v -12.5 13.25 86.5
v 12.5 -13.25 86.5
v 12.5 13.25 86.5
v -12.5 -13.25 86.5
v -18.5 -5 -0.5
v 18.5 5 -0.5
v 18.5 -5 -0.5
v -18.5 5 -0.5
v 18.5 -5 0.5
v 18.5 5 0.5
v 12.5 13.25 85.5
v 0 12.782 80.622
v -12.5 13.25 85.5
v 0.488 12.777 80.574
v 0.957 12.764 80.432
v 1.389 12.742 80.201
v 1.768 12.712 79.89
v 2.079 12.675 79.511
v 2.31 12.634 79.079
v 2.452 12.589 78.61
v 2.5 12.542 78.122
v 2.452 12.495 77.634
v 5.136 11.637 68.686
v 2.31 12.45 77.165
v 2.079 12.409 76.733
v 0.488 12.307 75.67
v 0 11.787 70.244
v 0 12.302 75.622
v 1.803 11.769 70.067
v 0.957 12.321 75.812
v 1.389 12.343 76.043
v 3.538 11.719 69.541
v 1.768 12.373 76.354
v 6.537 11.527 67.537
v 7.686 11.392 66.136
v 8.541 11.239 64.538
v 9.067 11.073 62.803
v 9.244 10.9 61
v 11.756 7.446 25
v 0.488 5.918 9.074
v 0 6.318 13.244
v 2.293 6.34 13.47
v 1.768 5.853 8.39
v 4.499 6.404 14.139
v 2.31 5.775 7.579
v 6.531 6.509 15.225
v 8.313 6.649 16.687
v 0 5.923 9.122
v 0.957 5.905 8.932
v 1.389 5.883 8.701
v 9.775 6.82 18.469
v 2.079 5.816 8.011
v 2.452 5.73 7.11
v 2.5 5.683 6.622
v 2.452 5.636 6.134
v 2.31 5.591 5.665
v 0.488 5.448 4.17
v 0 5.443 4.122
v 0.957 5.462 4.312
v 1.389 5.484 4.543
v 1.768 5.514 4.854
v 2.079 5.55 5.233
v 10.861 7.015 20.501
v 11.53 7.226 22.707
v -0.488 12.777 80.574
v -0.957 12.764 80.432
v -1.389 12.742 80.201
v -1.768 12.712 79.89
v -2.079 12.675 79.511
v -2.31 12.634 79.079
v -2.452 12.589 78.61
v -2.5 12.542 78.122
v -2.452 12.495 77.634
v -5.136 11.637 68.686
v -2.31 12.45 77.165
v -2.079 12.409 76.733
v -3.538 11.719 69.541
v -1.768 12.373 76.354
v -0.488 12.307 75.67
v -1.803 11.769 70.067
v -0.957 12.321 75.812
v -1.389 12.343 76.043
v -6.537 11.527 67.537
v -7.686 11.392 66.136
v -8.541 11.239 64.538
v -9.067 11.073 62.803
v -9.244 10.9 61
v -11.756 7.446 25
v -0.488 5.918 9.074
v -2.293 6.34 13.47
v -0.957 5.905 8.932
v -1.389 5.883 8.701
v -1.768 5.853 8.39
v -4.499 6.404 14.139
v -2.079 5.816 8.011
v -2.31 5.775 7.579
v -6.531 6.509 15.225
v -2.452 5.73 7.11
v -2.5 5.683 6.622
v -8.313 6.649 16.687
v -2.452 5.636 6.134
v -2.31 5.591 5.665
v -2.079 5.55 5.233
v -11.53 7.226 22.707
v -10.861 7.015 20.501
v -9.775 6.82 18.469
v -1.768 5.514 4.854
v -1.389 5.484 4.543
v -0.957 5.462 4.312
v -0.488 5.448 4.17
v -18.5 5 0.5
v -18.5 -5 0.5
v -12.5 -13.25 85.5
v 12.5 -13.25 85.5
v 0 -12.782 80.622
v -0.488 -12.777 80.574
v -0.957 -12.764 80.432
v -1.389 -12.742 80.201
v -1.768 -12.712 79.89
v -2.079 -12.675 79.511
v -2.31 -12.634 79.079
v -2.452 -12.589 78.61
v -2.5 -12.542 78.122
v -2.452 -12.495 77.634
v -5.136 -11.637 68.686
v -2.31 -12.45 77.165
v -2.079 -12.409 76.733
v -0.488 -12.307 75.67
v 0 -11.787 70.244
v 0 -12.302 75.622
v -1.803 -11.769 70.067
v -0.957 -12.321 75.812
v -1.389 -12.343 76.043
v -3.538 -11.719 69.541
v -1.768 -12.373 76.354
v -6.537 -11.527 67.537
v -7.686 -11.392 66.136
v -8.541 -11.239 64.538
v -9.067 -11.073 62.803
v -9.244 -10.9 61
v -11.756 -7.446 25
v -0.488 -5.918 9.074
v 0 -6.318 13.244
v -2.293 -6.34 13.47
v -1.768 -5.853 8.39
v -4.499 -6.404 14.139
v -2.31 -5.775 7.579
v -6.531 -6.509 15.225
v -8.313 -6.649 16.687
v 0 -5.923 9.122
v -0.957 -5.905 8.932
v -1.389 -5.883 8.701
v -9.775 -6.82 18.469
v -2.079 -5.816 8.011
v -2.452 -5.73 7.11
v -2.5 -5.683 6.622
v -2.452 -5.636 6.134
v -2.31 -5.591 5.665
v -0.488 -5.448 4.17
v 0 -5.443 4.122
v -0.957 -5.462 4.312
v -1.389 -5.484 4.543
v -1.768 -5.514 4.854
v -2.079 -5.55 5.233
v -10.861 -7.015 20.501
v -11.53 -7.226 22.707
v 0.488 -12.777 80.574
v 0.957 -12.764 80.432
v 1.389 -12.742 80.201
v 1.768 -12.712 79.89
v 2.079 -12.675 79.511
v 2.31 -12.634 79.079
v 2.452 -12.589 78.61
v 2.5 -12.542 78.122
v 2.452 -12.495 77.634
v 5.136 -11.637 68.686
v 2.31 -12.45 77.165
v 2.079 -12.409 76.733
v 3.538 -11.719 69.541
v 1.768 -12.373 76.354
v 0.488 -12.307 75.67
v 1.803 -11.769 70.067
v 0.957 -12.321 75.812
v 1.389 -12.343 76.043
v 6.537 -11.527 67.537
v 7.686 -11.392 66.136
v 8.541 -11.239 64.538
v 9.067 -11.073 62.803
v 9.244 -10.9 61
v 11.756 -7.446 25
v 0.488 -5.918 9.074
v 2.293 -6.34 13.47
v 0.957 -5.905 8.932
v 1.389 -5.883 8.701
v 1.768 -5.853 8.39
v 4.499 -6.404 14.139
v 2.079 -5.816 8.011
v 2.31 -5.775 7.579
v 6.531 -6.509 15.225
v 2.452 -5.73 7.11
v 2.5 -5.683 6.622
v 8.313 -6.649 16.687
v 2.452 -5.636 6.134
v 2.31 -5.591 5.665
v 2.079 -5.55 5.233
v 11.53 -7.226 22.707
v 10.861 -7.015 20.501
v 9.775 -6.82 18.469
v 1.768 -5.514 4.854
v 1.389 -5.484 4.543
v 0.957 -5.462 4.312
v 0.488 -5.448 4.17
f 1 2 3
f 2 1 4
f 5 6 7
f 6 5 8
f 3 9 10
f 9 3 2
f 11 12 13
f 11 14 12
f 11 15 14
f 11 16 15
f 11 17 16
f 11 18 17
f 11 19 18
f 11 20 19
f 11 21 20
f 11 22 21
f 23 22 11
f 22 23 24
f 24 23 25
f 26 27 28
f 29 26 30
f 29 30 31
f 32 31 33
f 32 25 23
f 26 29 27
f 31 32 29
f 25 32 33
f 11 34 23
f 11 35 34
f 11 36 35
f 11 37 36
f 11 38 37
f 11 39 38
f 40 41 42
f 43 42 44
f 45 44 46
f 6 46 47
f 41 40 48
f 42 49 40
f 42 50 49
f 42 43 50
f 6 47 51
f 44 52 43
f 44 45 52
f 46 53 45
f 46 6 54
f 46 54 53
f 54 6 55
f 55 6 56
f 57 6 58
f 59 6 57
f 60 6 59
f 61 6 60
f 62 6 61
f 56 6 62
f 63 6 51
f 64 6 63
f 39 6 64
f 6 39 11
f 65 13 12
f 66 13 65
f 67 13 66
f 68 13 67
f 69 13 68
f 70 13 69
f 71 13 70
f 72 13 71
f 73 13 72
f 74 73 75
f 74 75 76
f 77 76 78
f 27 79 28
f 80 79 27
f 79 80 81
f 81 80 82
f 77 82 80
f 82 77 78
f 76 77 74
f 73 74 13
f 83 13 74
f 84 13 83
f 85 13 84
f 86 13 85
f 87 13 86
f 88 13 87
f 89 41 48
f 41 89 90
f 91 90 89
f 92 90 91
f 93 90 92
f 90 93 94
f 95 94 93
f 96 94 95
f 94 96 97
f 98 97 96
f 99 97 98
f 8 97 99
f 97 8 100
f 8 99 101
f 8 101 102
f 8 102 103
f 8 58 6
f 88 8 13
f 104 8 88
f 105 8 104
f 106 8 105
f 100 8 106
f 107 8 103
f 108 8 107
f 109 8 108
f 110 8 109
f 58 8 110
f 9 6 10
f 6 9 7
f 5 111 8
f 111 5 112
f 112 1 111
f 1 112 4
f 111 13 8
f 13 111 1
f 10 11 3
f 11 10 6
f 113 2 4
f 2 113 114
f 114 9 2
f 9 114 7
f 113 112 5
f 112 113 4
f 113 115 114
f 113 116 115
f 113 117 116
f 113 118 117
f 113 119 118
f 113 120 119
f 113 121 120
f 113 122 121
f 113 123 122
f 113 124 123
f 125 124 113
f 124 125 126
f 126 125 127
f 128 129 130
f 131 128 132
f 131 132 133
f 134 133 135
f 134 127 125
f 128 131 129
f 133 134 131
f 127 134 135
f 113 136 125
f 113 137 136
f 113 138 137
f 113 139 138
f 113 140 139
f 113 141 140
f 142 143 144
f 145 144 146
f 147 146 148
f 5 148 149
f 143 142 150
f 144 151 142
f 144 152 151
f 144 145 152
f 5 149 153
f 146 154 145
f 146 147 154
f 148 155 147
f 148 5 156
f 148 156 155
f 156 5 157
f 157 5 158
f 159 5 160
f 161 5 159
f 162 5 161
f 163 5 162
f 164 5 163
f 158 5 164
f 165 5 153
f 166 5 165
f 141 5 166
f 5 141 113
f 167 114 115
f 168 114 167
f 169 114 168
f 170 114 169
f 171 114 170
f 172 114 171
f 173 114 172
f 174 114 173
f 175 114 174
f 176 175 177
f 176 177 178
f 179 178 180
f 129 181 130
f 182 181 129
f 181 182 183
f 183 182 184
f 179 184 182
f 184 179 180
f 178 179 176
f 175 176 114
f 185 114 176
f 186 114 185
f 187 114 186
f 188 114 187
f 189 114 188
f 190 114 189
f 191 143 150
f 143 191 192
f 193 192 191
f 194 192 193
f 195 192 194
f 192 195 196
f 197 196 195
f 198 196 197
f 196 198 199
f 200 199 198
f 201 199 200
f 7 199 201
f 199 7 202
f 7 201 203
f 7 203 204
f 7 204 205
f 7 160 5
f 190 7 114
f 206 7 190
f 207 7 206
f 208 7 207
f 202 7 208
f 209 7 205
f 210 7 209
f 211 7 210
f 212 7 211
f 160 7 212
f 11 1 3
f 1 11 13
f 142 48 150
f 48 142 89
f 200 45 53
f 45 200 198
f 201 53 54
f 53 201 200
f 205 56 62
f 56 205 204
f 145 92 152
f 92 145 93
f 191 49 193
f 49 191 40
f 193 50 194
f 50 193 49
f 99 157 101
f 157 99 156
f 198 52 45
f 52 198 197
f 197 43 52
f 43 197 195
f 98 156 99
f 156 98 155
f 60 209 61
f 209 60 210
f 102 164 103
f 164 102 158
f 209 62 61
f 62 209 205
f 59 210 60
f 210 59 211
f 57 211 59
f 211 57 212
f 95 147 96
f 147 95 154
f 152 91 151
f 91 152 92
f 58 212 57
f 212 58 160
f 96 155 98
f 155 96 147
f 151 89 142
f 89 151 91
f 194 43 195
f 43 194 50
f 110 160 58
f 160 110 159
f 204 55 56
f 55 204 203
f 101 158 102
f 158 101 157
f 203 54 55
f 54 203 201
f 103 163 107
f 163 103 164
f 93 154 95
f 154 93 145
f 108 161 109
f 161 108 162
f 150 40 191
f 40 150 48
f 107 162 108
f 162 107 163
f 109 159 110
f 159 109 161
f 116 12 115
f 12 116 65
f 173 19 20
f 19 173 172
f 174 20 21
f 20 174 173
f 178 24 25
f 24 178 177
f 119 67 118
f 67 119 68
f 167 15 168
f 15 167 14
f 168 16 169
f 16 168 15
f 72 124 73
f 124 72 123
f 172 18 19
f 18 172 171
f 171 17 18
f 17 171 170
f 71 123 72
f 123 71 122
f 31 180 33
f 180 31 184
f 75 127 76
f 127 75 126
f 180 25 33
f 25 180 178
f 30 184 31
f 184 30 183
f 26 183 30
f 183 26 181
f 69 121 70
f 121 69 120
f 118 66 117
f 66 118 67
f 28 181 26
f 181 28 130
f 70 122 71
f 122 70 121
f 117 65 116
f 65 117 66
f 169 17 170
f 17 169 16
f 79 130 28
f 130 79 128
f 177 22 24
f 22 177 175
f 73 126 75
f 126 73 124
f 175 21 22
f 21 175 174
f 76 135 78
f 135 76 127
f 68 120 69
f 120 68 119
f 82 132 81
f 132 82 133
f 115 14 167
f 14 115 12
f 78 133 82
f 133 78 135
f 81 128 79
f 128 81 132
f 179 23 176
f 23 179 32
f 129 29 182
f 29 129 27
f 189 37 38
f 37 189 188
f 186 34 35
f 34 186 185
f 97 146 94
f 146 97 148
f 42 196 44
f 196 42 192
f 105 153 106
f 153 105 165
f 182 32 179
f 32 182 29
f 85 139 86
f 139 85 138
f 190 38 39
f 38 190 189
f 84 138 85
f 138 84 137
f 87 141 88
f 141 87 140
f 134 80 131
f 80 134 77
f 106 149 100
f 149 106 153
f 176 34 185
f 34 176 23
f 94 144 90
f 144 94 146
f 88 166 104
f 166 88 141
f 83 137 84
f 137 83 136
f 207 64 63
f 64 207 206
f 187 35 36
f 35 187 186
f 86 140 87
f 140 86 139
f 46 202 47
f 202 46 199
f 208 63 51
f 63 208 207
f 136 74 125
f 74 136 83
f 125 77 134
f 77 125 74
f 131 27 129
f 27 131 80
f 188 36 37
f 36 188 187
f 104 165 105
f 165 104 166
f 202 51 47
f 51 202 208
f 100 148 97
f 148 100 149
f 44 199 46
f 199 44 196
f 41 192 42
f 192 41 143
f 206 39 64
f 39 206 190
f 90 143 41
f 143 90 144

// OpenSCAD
/*
Parameterized IKEA Samla Wedge NG
Copyright (C) 2024  nomike[AT]nomike[DOT]com

This program is free software: you can redistribute it and/or modify
it under the terms of the GNU General Public License as published by
the Free Software Foundation, either version 3 of the License, or
(at your option) any later version.

This program is distributed in the hope that it will be useful,
but WITHOUT ANY WARRANTY; without even the implied warranty of
MERCHANTABILITY or FITNESS FOR A PARTICULAR PURPOSE.  See the
GNU General Public License for more details.

You should have received a copy of the GNU General Public License
along with this program.  If not, see <http://www.gnu.org/licenses/>.
*/

// Parameterized IKEA Samla Wedge NG
// created by nomike
// licensed under GPLv3
// created by iggy 
// licensed under CC BY-SA (https://creativecommons.org/licenses/by-sa/4.0/)
// remixed from https://www.thingiverse.com/thing:479007 by Dvogonen


total_height = 87;
bottom_x = 37;
bottom_y = 10;
top_x = 25;
top_y = 26.5;
// Holes for putting zip-ties through
hole_diameter = 5;
// gap between the top/bottom surface and the rim of the oval cutout
oval_z_offset = 25;
// gap between the sides and the oval cutout; Set to something big to remove the cutout completely
oval_y_offset = 10;

/* [Hidden] */
x = 12;

_calculated_height = total_height - 1;
_bottom_oval_z_offset = oval_z_offset;
_top_oval_z_offset_from_top = _calculated_height - oval_z_offset;
_wide_z_offset = _calculated_height;
_oval_top_diameter = bottom_x - (((_wide_z_offset - oval_z_offset)/_calculated_height)*(bottom_x - top_x)) - oval_y_offset;
_oval_bottom_diameter = bottom_x - ((oval_z_offset/_calculated_height)*(bottom_x - top_x)) - oval_y_offset;

_bottom_hole_offset = (_bottom_oval_z_offset - (_oval_bottom_diameter / 2)) / 2;
_top_hole_offset = _top_oval_z_offset_from_top + ((_calculated_height  
- _top_oval_z_offset_from_top) / 2) + (_oval_top_diameter / 4);

difference (){
    color("green") hull(){
        cube([bottom_x,bottom_y,1],center=true);
        translate([0,0,_wide_z_offset]) cube([top_x,top_y,1],center=true);
    }

    color("red") translate([0,0,_bottom_hole_offset]) rotate([90,0,0]) cylinder(d=hole_diameter,h=top_y,center=true,$fn=32);
    color("blue") translate([0,0,_top_hole_offset]) rotate([90,0,0]) cylinder(d=hole_diameter,h=top_y+10,center=true,$fn=32);
    color("magenta") hull(){
        translate([0,0, _bottom_oval_z_offset]) rotate([90,0,0]) cylinder(d=_oval_bottom_diameter,h=top_y,center=true,$fn=32);
        translate([0,0, _top_oval_z_offset_from_top]) rotate([90,0,0]) cylinder(d=_oval_top_diameter,h=top_y,center=true,$fn=32);
    }
}
